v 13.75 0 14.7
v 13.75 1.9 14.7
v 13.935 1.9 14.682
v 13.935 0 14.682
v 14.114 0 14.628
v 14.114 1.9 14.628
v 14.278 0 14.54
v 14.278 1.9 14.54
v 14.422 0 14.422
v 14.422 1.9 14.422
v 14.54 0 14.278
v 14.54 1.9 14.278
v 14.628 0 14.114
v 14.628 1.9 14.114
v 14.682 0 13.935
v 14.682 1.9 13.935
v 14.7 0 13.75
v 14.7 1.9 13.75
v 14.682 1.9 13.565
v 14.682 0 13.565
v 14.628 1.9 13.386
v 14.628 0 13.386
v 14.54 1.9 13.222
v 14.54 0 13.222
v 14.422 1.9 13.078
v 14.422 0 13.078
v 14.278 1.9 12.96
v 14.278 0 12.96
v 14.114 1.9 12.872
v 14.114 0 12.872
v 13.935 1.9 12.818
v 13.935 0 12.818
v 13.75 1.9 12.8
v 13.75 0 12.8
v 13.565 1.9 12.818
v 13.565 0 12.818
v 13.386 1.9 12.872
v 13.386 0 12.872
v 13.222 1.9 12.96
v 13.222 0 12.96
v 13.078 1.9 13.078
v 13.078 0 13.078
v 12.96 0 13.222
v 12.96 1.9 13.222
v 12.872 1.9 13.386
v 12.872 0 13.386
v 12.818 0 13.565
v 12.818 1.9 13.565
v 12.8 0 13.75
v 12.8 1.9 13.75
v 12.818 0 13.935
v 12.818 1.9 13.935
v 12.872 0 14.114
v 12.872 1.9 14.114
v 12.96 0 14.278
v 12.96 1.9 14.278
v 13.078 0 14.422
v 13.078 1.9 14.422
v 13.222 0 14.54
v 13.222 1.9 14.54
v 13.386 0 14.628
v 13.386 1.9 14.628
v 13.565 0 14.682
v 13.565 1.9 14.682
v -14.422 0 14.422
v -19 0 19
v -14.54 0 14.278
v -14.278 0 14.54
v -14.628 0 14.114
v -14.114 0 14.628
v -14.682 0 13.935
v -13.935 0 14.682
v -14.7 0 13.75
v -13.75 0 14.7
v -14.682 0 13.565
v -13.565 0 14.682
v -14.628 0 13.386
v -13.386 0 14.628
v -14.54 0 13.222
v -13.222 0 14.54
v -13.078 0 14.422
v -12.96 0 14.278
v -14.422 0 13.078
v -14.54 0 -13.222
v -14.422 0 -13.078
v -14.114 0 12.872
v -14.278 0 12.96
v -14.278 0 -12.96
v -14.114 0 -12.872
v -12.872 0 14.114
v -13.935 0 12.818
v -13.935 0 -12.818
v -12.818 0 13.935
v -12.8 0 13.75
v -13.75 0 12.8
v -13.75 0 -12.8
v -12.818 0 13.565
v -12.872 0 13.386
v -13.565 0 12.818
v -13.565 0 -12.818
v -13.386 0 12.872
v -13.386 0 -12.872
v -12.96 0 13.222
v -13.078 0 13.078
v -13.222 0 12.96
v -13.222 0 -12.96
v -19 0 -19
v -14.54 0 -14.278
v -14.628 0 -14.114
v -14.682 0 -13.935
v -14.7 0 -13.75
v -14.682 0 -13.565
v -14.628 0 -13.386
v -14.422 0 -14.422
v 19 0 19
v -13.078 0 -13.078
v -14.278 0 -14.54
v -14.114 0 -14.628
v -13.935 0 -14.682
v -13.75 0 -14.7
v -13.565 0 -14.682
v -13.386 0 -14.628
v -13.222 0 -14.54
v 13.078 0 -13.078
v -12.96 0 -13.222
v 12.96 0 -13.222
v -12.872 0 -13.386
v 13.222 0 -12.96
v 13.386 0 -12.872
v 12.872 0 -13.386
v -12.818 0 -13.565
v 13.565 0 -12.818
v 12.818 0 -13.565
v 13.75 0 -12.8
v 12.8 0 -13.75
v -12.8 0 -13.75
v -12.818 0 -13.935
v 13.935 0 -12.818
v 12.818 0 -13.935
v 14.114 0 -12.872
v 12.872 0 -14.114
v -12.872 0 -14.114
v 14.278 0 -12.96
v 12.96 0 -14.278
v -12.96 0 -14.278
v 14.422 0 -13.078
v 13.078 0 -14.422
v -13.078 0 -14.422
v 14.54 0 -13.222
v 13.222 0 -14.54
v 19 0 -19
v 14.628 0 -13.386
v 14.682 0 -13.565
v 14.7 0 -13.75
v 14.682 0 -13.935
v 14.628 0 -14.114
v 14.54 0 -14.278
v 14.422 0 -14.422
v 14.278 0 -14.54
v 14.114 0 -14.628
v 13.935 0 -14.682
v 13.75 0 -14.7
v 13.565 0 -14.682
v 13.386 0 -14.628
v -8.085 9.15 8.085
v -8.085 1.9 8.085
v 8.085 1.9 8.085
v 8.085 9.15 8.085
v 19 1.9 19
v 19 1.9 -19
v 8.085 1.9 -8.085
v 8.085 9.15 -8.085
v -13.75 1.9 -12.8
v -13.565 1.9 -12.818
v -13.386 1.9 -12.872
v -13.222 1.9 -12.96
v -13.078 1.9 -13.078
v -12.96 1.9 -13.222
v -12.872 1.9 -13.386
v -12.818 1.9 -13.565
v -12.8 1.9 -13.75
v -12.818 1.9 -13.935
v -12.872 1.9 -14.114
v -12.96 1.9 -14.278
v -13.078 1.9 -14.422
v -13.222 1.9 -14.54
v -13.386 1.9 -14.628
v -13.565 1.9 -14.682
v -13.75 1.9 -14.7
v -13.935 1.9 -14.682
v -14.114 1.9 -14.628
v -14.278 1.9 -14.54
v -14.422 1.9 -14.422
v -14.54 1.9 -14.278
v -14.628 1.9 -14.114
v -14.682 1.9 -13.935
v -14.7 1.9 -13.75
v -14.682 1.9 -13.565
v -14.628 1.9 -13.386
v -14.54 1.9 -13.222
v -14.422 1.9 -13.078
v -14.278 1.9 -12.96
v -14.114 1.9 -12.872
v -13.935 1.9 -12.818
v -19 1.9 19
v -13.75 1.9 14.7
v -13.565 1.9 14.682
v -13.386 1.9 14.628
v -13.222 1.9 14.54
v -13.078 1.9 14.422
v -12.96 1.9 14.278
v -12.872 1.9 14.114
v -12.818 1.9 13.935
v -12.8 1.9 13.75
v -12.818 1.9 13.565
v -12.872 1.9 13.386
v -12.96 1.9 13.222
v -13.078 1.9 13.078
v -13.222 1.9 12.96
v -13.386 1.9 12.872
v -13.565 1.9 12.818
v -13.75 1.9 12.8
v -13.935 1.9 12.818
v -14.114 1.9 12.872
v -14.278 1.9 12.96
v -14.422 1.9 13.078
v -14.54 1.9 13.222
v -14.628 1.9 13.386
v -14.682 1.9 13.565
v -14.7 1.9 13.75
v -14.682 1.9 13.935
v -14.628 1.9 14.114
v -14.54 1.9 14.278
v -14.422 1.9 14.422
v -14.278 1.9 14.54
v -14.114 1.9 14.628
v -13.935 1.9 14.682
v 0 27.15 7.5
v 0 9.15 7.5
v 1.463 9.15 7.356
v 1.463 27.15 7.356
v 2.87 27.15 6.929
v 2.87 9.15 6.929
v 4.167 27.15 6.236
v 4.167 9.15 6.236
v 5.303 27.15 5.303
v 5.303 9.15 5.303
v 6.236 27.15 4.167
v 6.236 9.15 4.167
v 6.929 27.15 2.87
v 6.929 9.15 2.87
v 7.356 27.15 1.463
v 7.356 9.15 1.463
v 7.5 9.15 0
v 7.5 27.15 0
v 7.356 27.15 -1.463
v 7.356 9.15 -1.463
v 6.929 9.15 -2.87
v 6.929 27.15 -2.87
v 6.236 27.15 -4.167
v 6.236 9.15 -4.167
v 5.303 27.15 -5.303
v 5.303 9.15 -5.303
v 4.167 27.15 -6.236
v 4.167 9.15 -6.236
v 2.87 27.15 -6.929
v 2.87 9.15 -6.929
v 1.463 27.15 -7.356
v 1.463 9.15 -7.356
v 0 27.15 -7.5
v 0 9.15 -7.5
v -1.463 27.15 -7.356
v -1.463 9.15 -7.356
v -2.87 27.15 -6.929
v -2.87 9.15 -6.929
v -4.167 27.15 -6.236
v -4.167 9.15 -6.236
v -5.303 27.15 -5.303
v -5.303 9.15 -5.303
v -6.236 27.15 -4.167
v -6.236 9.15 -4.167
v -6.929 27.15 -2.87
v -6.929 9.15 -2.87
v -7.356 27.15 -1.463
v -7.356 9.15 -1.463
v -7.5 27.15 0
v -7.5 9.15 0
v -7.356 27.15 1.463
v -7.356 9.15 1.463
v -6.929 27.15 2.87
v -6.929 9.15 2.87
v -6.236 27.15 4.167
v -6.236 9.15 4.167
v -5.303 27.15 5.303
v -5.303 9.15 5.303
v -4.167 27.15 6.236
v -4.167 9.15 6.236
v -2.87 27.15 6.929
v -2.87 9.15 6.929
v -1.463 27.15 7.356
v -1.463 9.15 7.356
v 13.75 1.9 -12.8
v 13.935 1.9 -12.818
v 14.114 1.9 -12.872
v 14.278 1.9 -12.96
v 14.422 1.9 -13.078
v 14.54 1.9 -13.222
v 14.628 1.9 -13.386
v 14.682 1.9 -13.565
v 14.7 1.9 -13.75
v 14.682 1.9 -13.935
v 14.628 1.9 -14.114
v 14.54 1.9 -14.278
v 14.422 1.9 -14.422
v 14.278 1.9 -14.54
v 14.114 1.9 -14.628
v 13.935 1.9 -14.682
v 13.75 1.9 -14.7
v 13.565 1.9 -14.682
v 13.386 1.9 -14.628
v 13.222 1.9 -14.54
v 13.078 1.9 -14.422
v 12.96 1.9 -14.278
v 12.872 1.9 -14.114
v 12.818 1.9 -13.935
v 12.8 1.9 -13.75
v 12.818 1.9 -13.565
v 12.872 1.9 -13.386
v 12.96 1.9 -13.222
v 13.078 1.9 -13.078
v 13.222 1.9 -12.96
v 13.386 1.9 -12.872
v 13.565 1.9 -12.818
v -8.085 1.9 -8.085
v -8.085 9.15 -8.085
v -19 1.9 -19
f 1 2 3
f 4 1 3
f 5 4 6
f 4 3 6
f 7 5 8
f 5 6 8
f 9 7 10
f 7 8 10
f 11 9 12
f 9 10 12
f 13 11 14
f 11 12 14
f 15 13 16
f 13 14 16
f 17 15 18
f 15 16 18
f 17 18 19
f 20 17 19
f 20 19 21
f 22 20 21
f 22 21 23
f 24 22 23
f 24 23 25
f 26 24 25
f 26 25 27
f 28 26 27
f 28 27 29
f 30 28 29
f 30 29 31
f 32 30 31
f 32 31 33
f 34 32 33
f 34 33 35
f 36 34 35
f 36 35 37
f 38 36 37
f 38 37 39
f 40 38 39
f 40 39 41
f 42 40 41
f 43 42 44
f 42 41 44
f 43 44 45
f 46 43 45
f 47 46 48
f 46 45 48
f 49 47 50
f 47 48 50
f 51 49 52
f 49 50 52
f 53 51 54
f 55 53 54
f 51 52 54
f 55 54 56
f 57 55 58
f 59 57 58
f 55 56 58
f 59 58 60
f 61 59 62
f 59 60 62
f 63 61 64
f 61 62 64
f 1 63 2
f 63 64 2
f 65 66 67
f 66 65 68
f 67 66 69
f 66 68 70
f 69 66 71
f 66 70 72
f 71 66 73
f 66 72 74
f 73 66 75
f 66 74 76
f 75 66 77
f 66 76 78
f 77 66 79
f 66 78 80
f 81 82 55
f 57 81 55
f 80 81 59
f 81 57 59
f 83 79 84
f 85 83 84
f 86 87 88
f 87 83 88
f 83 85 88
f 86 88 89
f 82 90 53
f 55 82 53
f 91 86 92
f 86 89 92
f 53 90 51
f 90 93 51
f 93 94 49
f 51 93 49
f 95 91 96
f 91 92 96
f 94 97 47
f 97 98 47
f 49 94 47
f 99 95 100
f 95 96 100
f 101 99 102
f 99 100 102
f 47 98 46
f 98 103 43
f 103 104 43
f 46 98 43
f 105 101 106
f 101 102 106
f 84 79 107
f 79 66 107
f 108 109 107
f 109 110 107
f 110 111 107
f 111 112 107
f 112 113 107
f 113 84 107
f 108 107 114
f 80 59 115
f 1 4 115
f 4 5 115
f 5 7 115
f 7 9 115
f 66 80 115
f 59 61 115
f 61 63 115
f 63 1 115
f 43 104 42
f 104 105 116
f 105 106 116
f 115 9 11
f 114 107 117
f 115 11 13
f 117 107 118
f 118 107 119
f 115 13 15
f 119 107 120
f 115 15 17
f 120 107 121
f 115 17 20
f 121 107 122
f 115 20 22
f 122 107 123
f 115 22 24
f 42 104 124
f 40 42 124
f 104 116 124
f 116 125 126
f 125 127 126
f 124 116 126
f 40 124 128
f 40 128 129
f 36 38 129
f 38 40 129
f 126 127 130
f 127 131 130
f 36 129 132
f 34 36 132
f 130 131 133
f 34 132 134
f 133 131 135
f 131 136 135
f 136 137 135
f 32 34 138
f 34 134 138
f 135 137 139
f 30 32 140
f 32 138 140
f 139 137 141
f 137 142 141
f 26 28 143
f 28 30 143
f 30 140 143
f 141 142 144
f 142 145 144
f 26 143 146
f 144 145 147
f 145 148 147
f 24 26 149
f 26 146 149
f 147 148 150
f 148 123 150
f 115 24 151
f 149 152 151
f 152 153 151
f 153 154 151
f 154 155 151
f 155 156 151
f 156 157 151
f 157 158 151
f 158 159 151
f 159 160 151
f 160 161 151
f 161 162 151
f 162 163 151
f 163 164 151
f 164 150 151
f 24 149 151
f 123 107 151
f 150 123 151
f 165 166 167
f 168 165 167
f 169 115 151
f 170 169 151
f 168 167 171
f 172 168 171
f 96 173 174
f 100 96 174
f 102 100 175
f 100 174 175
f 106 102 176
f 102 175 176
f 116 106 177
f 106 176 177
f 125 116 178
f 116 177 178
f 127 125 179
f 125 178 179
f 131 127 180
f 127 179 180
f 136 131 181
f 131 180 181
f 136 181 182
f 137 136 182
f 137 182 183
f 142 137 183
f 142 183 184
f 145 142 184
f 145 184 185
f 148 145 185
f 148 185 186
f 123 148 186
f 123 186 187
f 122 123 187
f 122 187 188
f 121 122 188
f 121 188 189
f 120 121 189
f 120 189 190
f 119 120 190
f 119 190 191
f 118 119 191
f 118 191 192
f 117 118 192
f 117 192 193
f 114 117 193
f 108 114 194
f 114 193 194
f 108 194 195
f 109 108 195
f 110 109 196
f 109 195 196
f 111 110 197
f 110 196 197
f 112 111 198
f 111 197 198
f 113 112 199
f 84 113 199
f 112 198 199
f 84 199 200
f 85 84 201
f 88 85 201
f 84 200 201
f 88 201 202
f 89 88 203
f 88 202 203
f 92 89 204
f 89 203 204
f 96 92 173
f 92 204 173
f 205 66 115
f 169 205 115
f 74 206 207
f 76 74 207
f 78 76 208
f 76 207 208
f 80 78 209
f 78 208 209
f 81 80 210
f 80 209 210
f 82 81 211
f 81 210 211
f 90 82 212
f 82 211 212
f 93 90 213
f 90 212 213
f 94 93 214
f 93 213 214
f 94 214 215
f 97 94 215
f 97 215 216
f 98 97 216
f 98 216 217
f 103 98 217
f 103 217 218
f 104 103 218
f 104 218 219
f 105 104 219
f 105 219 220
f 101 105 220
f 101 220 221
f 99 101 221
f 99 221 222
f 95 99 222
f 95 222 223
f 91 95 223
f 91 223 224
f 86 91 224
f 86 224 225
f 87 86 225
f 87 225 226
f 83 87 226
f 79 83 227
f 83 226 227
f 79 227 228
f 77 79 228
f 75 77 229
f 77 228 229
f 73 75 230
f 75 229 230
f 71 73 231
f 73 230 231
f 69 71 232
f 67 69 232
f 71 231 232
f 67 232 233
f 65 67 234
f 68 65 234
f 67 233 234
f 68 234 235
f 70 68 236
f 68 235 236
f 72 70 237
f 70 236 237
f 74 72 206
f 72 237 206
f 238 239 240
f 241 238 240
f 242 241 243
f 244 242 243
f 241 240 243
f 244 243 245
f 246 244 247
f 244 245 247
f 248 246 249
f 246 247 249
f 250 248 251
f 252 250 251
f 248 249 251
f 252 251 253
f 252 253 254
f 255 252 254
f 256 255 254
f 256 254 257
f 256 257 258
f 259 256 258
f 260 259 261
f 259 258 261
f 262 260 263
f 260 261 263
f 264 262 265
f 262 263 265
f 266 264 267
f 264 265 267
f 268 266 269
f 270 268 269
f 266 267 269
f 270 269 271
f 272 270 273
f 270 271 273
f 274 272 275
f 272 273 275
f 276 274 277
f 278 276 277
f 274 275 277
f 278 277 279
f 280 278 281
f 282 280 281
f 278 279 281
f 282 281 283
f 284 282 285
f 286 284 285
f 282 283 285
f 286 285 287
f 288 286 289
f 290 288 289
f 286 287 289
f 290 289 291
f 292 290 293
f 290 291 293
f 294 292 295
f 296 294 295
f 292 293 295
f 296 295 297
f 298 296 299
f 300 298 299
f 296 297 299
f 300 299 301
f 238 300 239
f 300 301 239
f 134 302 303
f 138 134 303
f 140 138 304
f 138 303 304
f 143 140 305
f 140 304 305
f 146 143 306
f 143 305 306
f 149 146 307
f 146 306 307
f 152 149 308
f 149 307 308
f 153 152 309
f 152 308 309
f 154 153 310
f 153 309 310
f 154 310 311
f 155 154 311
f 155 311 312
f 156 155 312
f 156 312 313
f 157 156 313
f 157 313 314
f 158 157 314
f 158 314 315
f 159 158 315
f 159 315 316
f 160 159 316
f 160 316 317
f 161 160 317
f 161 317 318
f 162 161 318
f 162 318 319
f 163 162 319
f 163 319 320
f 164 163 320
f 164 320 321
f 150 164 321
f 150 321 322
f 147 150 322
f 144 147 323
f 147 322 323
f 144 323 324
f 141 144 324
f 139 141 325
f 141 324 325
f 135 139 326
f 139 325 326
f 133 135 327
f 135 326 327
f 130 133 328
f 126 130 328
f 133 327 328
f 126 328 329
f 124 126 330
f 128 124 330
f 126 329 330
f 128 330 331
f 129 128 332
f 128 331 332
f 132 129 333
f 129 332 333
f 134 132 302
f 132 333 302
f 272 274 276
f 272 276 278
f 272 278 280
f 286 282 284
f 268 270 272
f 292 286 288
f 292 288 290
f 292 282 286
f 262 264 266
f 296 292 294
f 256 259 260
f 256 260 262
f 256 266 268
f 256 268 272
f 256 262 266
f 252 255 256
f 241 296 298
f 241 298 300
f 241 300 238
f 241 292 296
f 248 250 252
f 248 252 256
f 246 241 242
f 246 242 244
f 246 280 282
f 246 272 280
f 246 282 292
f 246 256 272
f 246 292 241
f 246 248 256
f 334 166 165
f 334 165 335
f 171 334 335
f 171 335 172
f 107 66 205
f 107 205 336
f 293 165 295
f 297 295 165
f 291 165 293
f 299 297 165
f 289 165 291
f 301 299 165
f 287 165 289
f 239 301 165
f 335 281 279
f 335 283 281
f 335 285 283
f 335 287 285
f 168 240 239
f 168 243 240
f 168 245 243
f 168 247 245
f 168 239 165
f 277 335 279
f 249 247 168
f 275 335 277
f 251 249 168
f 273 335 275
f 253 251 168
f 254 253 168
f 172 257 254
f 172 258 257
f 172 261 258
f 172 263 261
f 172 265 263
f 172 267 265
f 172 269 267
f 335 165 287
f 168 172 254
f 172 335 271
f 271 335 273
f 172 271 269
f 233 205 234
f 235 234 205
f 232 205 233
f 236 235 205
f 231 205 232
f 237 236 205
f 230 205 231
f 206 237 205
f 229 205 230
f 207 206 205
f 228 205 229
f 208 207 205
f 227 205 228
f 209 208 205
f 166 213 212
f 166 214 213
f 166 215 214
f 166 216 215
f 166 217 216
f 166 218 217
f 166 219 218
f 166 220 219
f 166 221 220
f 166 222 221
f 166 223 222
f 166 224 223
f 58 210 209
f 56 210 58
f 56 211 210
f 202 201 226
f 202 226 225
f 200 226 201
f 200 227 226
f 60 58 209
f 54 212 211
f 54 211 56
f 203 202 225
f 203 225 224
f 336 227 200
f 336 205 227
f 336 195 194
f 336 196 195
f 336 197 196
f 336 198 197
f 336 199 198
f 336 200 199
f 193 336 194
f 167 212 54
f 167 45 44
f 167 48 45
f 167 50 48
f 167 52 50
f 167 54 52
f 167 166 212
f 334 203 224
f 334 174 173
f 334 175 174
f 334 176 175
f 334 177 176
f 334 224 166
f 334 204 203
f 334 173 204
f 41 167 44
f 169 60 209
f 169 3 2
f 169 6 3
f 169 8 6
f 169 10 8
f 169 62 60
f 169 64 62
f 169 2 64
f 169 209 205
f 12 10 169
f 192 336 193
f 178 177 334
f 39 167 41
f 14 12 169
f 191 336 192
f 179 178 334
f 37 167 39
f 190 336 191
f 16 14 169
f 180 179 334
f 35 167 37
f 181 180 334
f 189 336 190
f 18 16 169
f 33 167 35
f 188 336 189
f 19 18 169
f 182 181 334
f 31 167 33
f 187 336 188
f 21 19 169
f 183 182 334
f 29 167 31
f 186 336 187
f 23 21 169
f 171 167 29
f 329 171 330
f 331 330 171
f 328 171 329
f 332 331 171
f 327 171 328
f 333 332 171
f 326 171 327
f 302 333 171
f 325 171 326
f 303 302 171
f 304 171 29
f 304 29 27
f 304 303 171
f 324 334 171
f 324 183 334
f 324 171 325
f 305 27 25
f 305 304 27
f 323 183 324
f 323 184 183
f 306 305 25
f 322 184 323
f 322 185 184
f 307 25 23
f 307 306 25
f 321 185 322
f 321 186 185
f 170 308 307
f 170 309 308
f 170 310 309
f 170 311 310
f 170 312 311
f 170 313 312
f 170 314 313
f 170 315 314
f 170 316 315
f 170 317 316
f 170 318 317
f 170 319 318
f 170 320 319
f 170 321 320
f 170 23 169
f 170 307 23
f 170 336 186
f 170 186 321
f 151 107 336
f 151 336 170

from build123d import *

# Parameters (mm, degrees)
SKETCH1_W           = 38
SKETCH1_H           = 38
BOSS_EXTRUDE1_DEPTH = 1.9
SKETCH2_W           = 16.17
SKETCH2_H           = 16.17
BOSS_EXTRUDE2_DEPTH = 7.25
SKETCH4_R           = 7.5
BOSS_EXTRUDE3_DEPTH = 18
SKETCH5_R           = 0.95
CUT_EXTRUDE1_DEPTH  = 18


with BuildPart() as part:
    # Sketch1 → Boss-Extrude1 (new body)
    with BuildSketch(Plane(origin=(0, 0, 0), x_dir=(1, 0, 0), z_dir=(0, 1, 0))):
        Rectangle(SKETCH1_W, SKETCH1_H)
    extrude(amount=BOSS_EXTRUDE1_DEPTH)

    # Sketch2 → Boss-Extrude2 (add)
    with BuildSketch(Plane(origin=(0, 1.9, 0), x_dir=(1, 0, 0), z_dir=(0, 1, 0))):
        Rectangle(SKETCH2_W, SKETCH2_H)
    extrude(amount=BOSS_EXTRUDE2_DEPTH)

    # Sketch4 → Boss-Extrude3 (add)
    with BuildSketch(Plane(origin=(0, 9.15, 0), x_dir=(1, 0, 0), z_dir=(0, 1, 0))):
        with Locations(Location((0, 0, 0), (0, 0, 270))):
            Circle(SKETCH4_R)
    extrude(amount=BOSS_EXTRUDE3_DEPTH)

    # Sketch5 → Cut-Extrude1 (cut)
    with BuildSketch(Plane(origin=(0, 1.9, 0), x_dir=(1, 0, 0), z_dir=(0, 1, 0))):
        with Locations(Location((-13.75, 13.75, 0), (0, 0, 270))):
            Circle(SKETCH5_R)
        with Locations(Location((13.75, 13.75, 0), (0, 0, 270))):
            Circle(SKETCH5_R)
        with Locations(Location((13.75, -13.75, 0), (0, 0, 270))):
            Circle(SKETCH5_R)
        with Locations(Location((-13.75, -13.75, 0), (0, 0, 270))):
            Circle(SKETCH5_R)
    extrude(amount=-CUT_EXTRUDE1_DEPTH, mode=Mode.SUBTRACT)


solid = part.part
